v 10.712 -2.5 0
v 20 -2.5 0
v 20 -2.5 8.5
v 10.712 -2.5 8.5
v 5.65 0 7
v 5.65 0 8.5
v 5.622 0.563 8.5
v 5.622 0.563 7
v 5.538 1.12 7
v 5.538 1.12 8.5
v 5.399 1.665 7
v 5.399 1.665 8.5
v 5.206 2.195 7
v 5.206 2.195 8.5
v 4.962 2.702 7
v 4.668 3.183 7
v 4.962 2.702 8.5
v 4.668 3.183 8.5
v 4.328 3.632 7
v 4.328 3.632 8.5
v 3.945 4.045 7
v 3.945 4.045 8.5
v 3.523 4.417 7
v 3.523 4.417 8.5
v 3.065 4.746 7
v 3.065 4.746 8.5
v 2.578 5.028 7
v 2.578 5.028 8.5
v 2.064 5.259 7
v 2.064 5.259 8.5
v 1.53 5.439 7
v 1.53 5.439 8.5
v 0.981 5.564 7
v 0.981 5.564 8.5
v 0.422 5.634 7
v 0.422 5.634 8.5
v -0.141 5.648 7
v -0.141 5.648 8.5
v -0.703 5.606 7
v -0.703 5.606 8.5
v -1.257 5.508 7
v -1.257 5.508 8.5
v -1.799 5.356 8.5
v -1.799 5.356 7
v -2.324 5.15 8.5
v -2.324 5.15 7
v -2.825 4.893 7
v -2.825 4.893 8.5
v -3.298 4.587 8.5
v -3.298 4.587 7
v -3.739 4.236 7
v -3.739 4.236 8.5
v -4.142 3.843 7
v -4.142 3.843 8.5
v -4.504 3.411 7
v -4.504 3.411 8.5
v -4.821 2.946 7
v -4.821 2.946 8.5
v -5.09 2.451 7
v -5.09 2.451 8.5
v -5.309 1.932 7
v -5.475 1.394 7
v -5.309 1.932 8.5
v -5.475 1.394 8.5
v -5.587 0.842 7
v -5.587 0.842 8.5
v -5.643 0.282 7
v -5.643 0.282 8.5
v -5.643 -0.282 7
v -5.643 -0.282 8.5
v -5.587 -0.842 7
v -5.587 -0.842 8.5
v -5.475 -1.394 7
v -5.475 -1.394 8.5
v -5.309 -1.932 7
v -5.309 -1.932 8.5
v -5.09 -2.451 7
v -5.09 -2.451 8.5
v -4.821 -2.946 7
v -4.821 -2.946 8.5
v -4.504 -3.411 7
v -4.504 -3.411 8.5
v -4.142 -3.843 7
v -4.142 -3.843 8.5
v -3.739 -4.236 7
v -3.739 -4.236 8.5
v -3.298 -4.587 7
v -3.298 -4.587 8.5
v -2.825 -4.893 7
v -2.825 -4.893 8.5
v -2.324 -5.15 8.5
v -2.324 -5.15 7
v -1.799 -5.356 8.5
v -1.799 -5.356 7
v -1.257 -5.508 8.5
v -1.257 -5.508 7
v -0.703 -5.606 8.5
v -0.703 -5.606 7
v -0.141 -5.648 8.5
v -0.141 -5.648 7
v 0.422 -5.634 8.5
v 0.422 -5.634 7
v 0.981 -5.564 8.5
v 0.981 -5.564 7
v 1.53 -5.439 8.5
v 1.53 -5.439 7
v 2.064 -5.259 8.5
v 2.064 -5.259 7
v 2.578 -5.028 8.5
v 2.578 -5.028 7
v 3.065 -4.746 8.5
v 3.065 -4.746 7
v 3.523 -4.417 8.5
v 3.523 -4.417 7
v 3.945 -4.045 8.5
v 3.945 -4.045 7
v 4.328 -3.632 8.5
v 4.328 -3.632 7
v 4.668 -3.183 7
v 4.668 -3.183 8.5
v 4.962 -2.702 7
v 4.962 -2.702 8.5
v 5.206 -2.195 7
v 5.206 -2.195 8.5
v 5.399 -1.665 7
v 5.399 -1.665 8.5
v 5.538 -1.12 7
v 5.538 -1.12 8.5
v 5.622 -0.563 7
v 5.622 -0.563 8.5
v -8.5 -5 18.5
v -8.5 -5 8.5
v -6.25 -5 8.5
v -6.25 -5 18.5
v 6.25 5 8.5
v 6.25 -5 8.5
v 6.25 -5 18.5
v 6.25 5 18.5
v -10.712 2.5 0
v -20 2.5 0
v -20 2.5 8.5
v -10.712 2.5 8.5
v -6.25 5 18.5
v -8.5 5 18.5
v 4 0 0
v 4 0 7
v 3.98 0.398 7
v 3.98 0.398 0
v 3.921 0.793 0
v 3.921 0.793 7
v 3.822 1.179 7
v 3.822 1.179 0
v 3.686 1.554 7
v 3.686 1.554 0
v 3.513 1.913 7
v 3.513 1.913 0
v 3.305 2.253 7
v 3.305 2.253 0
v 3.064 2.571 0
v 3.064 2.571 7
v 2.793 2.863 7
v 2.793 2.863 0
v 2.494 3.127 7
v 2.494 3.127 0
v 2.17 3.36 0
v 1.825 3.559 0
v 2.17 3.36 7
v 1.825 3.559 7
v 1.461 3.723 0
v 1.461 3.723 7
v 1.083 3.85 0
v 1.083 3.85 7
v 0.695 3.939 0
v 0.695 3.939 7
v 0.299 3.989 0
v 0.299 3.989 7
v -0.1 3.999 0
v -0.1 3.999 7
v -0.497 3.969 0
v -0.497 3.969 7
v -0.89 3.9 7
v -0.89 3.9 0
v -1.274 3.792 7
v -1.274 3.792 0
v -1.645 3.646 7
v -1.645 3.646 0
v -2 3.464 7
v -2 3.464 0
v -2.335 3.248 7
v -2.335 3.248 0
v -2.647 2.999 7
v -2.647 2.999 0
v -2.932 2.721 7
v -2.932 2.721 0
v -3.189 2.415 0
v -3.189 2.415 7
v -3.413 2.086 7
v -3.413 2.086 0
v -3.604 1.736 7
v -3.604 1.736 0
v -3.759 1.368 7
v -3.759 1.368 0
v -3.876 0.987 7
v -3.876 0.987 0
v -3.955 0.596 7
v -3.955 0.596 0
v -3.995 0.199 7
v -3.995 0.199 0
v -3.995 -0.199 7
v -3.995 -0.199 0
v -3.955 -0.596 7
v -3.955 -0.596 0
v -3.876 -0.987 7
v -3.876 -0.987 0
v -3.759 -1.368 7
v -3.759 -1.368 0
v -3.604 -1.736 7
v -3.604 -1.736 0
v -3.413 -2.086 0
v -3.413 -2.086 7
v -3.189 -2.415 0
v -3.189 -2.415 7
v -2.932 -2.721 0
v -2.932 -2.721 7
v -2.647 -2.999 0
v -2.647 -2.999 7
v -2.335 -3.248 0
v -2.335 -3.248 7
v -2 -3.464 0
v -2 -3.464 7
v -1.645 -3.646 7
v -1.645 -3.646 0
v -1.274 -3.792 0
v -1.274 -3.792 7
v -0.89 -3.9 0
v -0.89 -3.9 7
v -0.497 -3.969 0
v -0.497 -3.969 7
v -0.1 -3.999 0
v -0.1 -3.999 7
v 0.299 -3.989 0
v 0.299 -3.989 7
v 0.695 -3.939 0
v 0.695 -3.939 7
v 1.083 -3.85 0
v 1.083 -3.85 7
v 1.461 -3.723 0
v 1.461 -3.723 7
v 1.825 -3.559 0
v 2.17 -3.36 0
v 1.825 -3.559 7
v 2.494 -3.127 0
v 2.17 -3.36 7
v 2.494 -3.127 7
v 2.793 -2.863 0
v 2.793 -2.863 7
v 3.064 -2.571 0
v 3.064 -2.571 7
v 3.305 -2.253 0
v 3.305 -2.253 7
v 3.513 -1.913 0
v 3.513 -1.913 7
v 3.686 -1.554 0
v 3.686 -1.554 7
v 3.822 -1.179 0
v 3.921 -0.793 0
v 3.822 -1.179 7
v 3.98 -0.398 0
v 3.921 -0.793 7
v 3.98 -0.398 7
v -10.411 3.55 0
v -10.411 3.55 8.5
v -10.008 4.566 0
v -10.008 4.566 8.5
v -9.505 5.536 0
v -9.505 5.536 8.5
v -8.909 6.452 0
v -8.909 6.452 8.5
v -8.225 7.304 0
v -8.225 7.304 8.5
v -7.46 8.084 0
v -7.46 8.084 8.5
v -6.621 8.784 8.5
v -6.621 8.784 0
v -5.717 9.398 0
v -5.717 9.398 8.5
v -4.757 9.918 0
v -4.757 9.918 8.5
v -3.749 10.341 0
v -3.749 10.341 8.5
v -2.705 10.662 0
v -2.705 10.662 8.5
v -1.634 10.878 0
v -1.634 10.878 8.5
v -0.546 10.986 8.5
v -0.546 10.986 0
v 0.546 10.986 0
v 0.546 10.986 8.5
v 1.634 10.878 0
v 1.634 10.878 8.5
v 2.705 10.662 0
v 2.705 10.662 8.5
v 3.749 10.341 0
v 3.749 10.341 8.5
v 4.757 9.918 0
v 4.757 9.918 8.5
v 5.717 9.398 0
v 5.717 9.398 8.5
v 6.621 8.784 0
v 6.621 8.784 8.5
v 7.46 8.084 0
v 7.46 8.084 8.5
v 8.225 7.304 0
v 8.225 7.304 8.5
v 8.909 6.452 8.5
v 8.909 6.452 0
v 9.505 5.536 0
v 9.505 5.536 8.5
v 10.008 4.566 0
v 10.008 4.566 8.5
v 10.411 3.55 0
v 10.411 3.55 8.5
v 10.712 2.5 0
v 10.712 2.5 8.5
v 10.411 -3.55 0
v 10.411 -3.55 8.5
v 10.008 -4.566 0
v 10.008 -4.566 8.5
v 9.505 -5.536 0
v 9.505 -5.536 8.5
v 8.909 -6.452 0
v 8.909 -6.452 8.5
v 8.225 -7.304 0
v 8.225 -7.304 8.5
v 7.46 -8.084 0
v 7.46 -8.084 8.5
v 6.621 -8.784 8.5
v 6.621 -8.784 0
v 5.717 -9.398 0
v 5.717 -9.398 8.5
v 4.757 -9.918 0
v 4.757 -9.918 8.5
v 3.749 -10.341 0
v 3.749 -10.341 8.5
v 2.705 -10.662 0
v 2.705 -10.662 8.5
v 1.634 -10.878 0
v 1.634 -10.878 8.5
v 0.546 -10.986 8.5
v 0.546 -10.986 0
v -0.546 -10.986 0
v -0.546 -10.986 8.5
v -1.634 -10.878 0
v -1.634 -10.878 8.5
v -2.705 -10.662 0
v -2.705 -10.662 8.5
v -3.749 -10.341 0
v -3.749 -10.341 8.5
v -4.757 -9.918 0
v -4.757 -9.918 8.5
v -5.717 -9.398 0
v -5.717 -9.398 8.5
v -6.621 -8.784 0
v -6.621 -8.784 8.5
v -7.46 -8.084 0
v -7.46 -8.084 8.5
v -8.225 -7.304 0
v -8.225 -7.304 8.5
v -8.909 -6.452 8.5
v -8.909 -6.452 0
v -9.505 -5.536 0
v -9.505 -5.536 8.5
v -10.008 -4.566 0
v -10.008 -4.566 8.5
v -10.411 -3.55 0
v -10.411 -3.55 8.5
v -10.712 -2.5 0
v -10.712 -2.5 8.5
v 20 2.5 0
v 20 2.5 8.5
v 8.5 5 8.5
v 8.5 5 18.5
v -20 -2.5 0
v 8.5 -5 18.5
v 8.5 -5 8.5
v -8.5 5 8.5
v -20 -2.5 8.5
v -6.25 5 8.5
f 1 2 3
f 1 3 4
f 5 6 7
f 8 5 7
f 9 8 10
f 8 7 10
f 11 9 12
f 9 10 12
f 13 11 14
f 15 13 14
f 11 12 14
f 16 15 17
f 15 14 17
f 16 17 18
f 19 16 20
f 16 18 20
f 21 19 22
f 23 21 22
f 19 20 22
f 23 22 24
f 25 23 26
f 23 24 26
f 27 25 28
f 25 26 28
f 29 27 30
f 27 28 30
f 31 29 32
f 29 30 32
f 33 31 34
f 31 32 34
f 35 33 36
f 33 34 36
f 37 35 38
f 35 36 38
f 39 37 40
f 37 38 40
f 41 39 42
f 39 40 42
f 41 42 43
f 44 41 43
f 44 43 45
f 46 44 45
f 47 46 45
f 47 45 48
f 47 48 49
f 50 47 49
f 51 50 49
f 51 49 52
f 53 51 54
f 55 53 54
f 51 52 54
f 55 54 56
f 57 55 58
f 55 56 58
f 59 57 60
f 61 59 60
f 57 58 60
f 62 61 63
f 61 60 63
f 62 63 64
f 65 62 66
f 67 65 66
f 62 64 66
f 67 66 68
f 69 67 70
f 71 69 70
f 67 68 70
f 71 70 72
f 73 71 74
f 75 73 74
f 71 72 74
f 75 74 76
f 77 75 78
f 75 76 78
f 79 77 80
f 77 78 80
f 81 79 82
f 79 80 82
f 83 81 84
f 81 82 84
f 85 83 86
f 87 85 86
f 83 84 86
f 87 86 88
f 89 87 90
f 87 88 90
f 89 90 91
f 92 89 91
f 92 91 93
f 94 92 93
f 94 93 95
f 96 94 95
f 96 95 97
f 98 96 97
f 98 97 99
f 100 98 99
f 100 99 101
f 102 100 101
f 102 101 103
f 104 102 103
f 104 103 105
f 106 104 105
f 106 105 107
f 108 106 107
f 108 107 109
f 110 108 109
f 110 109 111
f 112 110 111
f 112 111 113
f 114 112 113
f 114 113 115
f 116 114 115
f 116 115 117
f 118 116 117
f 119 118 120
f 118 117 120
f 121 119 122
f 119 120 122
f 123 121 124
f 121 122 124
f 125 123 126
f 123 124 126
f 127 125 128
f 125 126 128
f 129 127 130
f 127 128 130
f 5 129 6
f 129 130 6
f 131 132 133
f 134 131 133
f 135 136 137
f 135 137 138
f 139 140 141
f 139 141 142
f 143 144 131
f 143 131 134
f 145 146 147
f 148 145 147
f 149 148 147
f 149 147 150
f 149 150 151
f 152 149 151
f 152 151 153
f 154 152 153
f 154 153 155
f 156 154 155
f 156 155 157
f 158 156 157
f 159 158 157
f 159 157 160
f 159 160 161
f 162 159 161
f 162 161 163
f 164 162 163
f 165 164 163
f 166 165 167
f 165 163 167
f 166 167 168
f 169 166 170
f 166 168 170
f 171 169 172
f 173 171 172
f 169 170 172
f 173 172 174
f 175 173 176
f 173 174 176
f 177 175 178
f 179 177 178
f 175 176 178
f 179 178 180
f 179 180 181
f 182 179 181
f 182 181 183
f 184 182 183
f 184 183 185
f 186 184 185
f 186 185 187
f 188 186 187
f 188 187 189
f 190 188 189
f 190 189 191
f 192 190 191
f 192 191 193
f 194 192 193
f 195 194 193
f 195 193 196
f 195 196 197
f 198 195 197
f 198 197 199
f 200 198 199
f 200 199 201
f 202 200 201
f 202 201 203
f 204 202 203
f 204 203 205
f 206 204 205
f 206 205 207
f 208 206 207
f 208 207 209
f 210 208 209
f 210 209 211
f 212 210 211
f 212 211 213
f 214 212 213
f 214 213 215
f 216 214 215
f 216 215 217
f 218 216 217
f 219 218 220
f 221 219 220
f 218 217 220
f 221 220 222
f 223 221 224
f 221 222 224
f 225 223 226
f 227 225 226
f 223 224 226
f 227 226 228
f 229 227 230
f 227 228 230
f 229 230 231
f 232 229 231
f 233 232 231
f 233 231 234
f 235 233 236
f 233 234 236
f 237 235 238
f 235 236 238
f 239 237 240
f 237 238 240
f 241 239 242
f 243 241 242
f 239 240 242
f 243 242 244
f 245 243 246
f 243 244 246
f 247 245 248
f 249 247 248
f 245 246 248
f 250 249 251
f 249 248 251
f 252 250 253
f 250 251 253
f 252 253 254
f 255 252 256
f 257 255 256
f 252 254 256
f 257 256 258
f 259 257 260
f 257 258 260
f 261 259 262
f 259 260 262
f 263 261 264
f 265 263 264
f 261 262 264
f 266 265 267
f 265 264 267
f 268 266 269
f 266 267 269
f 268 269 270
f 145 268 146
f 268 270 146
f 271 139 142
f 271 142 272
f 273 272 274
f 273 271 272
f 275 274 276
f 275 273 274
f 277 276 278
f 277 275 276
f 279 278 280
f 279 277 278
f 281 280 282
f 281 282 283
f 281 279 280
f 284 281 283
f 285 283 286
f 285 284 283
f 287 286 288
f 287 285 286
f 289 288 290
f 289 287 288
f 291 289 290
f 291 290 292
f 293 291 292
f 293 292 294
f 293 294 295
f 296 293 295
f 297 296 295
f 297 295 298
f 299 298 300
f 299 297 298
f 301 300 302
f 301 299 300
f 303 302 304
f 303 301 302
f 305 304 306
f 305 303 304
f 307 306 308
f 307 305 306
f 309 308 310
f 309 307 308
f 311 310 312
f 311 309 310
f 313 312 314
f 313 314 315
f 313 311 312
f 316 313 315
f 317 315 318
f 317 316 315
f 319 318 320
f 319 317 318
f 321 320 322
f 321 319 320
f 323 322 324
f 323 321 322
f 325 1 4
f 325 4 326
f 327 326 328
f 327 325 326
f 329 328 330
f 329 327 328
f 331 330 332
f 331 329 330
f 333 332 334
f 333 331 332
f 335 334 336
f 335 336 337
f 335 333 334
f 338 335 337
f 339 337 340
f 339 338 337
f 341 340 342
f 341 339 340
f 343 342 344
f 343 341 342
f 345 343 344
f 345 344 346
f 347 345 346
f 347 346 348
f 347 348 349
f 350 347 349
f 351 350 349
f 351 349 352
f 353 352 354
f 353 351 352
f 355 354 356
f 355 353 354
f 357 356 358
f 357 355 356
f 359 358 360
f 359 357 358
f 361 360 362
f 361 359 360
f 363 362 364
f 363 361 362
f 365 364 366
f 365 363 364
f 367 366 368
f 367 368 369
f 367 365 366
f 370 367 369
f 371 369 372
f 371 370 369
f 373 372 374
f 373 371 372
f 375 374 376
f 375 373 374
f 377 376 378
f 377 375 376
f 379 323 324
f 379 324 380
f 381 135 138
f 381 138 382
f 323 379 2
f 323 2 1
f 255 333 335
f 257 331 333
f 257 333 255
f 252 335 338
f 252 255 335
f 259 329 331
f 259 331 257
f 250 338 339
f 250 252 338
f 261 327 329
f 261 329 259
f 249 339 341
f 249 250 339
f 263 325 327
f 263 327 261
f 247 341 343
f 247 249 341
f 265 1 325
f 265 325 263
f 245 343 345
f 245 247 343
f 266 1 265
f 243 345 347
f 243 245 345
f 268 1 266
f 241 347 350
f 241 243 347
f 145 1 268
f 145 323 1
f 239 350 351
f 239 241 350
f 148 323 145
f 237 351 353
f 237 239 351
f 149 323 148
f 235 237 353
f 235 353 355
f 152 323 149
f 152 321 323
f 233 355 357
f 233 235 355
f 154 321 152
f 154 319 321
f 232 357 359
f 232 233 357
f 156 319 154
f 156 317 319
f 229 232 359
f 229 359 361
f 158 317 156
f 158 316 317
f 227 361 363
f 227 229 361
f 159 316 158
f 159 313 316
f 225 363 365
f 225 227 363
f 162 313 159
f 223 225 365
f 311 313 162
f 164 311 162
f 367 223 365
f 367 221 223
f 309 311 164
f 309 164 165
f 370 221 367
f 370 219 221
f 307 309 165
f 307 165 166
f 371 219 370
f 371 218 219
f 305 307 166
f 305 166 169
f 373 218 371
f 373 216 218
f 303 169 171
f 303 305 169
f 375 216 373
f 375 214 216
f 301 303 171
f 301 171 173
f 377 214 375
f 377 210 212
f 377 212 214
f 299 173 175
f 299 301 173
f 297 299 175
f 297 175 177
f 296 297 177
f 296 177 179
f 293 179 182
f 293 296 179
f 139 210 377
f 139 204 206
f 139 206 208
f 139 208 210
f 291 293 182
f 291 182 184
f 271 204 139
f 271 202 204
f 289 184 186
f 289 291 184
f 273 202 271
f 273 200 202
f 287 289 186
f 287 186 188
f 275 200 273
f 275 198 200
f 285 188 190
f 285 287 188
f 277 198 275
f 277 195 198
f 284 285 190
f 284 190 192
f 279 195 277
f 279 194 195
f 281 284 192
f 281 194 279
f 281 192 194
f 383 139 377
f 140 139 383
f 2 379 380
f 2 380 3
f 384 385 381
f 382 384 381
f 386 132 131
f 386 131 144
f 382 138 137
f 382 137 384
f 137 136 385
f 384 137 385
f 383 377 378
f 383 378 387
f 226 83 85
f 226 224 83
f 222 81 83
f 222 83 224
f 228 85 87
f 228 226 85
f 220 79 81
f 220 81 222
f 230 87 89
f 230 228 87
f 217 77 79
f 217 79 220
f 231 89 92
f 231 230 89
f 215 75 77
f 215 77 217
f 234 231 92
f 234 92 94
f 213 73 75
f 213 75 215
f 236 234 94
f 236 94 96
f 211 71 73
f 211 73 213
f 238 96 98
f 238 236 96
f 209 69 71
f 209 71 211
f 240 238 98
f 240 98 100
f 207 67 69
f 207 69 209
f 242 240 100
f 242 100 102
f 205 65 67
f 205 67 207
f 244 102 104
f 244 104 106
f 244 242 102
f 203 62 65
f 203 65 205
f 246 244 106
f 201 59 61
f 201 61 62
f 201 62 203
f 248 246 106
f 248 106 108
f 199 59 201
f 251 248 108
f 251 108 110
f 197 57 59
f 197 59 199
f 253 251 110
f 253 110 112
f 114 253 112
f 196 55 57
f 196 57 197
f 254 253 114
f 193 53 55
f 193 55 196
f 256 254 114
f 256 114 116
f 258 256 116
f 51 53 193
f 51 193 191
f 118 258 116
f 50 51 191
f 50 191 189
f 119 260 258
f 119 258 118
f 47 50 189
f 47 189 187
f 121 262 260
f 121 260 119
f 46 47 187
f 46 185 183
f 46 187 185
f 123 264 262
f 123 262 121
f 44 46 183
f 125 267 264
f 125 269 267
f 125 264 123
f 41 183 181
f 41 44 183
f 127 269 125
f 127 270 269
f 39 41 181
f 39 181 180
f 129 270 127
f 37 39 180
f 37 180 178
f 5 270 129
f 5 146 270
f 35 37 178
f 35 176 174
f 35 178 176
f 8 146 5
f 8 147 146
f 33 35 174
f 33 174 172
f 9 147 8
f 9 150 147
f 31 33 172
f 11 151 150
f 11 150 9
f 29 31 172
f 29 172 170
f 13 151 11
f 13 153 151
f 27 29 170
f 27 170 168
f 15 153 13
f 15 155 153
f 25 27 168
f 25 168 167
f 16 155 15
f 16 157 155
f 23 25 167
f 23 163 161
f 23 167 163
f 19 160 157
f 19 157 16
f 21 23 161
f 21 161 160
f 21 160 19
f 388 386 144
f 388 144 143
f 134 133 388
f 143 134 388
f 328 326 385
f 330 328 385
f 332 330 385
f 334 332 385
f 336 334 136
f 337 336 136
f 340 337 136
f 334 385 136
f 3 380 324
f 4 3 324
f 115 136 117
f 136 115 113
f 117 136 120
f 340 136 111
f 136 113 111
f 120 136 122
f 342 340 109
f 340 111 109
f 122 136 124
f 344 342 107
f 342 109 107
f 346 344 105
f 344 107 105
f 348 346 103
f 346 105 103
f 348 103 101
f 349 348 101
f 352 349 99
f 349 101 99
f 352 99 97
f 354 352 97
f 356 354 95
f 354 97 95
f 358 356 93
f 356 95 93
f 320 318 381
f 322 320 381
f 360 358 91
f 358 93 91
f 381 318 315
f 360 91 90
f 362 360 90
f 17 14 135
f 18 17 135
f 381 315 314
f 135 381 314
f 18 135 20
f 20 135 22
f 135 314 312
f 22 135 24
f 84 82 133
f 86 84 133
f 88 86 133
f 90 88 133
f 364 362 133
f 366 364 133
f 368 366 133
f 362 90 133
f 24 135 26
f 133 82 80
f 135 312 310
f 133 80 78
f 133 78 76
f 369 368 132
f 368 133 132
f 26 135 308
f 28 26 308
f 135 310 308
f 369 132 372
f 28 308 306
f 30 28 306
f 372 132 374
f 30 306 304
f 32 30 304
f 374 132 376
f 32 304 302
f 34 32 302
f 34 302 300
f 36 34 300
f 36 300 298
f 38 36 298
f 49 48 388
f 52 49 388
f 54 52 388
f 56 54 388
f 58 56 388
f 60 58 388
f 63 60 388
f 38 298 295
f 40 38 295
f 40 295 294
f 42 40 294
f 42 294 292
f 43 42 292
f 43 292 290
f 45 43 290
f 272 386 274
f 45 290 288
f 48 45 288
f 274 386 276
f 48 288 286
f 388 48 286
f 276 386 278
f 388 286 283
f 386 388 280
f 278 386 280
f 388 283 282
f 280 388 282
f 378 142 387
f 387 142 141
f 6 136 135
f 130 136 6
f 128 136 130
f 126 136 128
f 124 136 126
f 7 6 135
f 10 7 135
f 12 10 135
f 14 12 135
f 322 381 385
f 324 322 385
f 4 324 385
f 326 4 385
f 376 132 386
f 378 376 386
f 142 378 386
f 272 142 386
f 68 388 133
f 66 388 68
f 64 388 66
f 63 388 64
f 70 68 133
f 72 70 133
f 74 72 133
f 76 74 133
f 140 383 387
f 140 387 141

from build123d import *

# Parameters (mm, degrees)
BOSS_EXTRUDE1_DEPTH = 8.5
CUT_EXTRUDE1_REACH  = 26.357
SKETCH2_R           = 4
SKETCH3_W           = 2.25
SKETCH3_H           = 10
BOSS_EXTRUDE3_DEPTH = 10
SKETCH4_R           = 5.65
CUT_EXTRUDE2_DEPTH  = 1.5


with BuildPart() as part:
    # Sketch1 → Boss-Extrude1 (new body)
    with BuildSketch(Plane.XY):
        with BuildLine():
            Line((10.712142643, 2.5), (20, 2.5))
            Line((20, 2.5), (20, -2.5))
            Line((20, -2.5), (10.712142643, -2.5))
            ThreePointArc((10.712142643, -2.5), (0, -11), (-10.712142643, -2.5))
            Line((-10.712142643, -2.5), (-20, -2.5))
            Line((-20, -2.5), (-20, 2.5))
            Line((-20, 2.5), (-10.712142643, 2.5))
            ThreePointArc((-10.712142643, 2.5), (0, 11), (10.712142643, 2.5))
        make_face()
    extrude(amount=BOSS_EXTRUDE1_DEPTH)

    # Sketch2 → Cut-Extrude1 (cut, up to next)
    with BuildSketch(Plane.XY.offset(8.5), mode=Mode.PRIVATE) as cut_extrude1_sk1:
        Circle(SKETCH2_R)
    cut_extrude1_tool1 = extrude(cut_extrude1_sk1.sketch, amount=-CUT_EXTRUDE1_REACH, mode=Mode.PRIVATE) & part.part
    add(cut_extrude1_tool1.solids().sort_by_distance((0, 0, 8.5))[0], mode=Mode.SUBTRACT)

    # Sketch3 → Boss-Extrude3 (add)
    with BuildSketch(Plane.XY.offset(8.5)):
        with Locations((7.375, 0)):
            Rectangle(SKETCH3_W, SKETCH3_H)
        with Locations((-7.375, 0)):
            Rectangle(SKETCH3_W, SKETCH3_H)
    extrude(amount=BOSS_EXTRUDE3_DEPTH)

    # Sketch4 → Cut-Extrude2 (cut)
    with BuildSketch(Plane.XY.offset(8.5)):
        Circle(SKETCH4_R)
    extrude(amount=-CUT_EXTRUDE2_DEPTH, mode=Mode.SUBTRACT)


solid = part.part
